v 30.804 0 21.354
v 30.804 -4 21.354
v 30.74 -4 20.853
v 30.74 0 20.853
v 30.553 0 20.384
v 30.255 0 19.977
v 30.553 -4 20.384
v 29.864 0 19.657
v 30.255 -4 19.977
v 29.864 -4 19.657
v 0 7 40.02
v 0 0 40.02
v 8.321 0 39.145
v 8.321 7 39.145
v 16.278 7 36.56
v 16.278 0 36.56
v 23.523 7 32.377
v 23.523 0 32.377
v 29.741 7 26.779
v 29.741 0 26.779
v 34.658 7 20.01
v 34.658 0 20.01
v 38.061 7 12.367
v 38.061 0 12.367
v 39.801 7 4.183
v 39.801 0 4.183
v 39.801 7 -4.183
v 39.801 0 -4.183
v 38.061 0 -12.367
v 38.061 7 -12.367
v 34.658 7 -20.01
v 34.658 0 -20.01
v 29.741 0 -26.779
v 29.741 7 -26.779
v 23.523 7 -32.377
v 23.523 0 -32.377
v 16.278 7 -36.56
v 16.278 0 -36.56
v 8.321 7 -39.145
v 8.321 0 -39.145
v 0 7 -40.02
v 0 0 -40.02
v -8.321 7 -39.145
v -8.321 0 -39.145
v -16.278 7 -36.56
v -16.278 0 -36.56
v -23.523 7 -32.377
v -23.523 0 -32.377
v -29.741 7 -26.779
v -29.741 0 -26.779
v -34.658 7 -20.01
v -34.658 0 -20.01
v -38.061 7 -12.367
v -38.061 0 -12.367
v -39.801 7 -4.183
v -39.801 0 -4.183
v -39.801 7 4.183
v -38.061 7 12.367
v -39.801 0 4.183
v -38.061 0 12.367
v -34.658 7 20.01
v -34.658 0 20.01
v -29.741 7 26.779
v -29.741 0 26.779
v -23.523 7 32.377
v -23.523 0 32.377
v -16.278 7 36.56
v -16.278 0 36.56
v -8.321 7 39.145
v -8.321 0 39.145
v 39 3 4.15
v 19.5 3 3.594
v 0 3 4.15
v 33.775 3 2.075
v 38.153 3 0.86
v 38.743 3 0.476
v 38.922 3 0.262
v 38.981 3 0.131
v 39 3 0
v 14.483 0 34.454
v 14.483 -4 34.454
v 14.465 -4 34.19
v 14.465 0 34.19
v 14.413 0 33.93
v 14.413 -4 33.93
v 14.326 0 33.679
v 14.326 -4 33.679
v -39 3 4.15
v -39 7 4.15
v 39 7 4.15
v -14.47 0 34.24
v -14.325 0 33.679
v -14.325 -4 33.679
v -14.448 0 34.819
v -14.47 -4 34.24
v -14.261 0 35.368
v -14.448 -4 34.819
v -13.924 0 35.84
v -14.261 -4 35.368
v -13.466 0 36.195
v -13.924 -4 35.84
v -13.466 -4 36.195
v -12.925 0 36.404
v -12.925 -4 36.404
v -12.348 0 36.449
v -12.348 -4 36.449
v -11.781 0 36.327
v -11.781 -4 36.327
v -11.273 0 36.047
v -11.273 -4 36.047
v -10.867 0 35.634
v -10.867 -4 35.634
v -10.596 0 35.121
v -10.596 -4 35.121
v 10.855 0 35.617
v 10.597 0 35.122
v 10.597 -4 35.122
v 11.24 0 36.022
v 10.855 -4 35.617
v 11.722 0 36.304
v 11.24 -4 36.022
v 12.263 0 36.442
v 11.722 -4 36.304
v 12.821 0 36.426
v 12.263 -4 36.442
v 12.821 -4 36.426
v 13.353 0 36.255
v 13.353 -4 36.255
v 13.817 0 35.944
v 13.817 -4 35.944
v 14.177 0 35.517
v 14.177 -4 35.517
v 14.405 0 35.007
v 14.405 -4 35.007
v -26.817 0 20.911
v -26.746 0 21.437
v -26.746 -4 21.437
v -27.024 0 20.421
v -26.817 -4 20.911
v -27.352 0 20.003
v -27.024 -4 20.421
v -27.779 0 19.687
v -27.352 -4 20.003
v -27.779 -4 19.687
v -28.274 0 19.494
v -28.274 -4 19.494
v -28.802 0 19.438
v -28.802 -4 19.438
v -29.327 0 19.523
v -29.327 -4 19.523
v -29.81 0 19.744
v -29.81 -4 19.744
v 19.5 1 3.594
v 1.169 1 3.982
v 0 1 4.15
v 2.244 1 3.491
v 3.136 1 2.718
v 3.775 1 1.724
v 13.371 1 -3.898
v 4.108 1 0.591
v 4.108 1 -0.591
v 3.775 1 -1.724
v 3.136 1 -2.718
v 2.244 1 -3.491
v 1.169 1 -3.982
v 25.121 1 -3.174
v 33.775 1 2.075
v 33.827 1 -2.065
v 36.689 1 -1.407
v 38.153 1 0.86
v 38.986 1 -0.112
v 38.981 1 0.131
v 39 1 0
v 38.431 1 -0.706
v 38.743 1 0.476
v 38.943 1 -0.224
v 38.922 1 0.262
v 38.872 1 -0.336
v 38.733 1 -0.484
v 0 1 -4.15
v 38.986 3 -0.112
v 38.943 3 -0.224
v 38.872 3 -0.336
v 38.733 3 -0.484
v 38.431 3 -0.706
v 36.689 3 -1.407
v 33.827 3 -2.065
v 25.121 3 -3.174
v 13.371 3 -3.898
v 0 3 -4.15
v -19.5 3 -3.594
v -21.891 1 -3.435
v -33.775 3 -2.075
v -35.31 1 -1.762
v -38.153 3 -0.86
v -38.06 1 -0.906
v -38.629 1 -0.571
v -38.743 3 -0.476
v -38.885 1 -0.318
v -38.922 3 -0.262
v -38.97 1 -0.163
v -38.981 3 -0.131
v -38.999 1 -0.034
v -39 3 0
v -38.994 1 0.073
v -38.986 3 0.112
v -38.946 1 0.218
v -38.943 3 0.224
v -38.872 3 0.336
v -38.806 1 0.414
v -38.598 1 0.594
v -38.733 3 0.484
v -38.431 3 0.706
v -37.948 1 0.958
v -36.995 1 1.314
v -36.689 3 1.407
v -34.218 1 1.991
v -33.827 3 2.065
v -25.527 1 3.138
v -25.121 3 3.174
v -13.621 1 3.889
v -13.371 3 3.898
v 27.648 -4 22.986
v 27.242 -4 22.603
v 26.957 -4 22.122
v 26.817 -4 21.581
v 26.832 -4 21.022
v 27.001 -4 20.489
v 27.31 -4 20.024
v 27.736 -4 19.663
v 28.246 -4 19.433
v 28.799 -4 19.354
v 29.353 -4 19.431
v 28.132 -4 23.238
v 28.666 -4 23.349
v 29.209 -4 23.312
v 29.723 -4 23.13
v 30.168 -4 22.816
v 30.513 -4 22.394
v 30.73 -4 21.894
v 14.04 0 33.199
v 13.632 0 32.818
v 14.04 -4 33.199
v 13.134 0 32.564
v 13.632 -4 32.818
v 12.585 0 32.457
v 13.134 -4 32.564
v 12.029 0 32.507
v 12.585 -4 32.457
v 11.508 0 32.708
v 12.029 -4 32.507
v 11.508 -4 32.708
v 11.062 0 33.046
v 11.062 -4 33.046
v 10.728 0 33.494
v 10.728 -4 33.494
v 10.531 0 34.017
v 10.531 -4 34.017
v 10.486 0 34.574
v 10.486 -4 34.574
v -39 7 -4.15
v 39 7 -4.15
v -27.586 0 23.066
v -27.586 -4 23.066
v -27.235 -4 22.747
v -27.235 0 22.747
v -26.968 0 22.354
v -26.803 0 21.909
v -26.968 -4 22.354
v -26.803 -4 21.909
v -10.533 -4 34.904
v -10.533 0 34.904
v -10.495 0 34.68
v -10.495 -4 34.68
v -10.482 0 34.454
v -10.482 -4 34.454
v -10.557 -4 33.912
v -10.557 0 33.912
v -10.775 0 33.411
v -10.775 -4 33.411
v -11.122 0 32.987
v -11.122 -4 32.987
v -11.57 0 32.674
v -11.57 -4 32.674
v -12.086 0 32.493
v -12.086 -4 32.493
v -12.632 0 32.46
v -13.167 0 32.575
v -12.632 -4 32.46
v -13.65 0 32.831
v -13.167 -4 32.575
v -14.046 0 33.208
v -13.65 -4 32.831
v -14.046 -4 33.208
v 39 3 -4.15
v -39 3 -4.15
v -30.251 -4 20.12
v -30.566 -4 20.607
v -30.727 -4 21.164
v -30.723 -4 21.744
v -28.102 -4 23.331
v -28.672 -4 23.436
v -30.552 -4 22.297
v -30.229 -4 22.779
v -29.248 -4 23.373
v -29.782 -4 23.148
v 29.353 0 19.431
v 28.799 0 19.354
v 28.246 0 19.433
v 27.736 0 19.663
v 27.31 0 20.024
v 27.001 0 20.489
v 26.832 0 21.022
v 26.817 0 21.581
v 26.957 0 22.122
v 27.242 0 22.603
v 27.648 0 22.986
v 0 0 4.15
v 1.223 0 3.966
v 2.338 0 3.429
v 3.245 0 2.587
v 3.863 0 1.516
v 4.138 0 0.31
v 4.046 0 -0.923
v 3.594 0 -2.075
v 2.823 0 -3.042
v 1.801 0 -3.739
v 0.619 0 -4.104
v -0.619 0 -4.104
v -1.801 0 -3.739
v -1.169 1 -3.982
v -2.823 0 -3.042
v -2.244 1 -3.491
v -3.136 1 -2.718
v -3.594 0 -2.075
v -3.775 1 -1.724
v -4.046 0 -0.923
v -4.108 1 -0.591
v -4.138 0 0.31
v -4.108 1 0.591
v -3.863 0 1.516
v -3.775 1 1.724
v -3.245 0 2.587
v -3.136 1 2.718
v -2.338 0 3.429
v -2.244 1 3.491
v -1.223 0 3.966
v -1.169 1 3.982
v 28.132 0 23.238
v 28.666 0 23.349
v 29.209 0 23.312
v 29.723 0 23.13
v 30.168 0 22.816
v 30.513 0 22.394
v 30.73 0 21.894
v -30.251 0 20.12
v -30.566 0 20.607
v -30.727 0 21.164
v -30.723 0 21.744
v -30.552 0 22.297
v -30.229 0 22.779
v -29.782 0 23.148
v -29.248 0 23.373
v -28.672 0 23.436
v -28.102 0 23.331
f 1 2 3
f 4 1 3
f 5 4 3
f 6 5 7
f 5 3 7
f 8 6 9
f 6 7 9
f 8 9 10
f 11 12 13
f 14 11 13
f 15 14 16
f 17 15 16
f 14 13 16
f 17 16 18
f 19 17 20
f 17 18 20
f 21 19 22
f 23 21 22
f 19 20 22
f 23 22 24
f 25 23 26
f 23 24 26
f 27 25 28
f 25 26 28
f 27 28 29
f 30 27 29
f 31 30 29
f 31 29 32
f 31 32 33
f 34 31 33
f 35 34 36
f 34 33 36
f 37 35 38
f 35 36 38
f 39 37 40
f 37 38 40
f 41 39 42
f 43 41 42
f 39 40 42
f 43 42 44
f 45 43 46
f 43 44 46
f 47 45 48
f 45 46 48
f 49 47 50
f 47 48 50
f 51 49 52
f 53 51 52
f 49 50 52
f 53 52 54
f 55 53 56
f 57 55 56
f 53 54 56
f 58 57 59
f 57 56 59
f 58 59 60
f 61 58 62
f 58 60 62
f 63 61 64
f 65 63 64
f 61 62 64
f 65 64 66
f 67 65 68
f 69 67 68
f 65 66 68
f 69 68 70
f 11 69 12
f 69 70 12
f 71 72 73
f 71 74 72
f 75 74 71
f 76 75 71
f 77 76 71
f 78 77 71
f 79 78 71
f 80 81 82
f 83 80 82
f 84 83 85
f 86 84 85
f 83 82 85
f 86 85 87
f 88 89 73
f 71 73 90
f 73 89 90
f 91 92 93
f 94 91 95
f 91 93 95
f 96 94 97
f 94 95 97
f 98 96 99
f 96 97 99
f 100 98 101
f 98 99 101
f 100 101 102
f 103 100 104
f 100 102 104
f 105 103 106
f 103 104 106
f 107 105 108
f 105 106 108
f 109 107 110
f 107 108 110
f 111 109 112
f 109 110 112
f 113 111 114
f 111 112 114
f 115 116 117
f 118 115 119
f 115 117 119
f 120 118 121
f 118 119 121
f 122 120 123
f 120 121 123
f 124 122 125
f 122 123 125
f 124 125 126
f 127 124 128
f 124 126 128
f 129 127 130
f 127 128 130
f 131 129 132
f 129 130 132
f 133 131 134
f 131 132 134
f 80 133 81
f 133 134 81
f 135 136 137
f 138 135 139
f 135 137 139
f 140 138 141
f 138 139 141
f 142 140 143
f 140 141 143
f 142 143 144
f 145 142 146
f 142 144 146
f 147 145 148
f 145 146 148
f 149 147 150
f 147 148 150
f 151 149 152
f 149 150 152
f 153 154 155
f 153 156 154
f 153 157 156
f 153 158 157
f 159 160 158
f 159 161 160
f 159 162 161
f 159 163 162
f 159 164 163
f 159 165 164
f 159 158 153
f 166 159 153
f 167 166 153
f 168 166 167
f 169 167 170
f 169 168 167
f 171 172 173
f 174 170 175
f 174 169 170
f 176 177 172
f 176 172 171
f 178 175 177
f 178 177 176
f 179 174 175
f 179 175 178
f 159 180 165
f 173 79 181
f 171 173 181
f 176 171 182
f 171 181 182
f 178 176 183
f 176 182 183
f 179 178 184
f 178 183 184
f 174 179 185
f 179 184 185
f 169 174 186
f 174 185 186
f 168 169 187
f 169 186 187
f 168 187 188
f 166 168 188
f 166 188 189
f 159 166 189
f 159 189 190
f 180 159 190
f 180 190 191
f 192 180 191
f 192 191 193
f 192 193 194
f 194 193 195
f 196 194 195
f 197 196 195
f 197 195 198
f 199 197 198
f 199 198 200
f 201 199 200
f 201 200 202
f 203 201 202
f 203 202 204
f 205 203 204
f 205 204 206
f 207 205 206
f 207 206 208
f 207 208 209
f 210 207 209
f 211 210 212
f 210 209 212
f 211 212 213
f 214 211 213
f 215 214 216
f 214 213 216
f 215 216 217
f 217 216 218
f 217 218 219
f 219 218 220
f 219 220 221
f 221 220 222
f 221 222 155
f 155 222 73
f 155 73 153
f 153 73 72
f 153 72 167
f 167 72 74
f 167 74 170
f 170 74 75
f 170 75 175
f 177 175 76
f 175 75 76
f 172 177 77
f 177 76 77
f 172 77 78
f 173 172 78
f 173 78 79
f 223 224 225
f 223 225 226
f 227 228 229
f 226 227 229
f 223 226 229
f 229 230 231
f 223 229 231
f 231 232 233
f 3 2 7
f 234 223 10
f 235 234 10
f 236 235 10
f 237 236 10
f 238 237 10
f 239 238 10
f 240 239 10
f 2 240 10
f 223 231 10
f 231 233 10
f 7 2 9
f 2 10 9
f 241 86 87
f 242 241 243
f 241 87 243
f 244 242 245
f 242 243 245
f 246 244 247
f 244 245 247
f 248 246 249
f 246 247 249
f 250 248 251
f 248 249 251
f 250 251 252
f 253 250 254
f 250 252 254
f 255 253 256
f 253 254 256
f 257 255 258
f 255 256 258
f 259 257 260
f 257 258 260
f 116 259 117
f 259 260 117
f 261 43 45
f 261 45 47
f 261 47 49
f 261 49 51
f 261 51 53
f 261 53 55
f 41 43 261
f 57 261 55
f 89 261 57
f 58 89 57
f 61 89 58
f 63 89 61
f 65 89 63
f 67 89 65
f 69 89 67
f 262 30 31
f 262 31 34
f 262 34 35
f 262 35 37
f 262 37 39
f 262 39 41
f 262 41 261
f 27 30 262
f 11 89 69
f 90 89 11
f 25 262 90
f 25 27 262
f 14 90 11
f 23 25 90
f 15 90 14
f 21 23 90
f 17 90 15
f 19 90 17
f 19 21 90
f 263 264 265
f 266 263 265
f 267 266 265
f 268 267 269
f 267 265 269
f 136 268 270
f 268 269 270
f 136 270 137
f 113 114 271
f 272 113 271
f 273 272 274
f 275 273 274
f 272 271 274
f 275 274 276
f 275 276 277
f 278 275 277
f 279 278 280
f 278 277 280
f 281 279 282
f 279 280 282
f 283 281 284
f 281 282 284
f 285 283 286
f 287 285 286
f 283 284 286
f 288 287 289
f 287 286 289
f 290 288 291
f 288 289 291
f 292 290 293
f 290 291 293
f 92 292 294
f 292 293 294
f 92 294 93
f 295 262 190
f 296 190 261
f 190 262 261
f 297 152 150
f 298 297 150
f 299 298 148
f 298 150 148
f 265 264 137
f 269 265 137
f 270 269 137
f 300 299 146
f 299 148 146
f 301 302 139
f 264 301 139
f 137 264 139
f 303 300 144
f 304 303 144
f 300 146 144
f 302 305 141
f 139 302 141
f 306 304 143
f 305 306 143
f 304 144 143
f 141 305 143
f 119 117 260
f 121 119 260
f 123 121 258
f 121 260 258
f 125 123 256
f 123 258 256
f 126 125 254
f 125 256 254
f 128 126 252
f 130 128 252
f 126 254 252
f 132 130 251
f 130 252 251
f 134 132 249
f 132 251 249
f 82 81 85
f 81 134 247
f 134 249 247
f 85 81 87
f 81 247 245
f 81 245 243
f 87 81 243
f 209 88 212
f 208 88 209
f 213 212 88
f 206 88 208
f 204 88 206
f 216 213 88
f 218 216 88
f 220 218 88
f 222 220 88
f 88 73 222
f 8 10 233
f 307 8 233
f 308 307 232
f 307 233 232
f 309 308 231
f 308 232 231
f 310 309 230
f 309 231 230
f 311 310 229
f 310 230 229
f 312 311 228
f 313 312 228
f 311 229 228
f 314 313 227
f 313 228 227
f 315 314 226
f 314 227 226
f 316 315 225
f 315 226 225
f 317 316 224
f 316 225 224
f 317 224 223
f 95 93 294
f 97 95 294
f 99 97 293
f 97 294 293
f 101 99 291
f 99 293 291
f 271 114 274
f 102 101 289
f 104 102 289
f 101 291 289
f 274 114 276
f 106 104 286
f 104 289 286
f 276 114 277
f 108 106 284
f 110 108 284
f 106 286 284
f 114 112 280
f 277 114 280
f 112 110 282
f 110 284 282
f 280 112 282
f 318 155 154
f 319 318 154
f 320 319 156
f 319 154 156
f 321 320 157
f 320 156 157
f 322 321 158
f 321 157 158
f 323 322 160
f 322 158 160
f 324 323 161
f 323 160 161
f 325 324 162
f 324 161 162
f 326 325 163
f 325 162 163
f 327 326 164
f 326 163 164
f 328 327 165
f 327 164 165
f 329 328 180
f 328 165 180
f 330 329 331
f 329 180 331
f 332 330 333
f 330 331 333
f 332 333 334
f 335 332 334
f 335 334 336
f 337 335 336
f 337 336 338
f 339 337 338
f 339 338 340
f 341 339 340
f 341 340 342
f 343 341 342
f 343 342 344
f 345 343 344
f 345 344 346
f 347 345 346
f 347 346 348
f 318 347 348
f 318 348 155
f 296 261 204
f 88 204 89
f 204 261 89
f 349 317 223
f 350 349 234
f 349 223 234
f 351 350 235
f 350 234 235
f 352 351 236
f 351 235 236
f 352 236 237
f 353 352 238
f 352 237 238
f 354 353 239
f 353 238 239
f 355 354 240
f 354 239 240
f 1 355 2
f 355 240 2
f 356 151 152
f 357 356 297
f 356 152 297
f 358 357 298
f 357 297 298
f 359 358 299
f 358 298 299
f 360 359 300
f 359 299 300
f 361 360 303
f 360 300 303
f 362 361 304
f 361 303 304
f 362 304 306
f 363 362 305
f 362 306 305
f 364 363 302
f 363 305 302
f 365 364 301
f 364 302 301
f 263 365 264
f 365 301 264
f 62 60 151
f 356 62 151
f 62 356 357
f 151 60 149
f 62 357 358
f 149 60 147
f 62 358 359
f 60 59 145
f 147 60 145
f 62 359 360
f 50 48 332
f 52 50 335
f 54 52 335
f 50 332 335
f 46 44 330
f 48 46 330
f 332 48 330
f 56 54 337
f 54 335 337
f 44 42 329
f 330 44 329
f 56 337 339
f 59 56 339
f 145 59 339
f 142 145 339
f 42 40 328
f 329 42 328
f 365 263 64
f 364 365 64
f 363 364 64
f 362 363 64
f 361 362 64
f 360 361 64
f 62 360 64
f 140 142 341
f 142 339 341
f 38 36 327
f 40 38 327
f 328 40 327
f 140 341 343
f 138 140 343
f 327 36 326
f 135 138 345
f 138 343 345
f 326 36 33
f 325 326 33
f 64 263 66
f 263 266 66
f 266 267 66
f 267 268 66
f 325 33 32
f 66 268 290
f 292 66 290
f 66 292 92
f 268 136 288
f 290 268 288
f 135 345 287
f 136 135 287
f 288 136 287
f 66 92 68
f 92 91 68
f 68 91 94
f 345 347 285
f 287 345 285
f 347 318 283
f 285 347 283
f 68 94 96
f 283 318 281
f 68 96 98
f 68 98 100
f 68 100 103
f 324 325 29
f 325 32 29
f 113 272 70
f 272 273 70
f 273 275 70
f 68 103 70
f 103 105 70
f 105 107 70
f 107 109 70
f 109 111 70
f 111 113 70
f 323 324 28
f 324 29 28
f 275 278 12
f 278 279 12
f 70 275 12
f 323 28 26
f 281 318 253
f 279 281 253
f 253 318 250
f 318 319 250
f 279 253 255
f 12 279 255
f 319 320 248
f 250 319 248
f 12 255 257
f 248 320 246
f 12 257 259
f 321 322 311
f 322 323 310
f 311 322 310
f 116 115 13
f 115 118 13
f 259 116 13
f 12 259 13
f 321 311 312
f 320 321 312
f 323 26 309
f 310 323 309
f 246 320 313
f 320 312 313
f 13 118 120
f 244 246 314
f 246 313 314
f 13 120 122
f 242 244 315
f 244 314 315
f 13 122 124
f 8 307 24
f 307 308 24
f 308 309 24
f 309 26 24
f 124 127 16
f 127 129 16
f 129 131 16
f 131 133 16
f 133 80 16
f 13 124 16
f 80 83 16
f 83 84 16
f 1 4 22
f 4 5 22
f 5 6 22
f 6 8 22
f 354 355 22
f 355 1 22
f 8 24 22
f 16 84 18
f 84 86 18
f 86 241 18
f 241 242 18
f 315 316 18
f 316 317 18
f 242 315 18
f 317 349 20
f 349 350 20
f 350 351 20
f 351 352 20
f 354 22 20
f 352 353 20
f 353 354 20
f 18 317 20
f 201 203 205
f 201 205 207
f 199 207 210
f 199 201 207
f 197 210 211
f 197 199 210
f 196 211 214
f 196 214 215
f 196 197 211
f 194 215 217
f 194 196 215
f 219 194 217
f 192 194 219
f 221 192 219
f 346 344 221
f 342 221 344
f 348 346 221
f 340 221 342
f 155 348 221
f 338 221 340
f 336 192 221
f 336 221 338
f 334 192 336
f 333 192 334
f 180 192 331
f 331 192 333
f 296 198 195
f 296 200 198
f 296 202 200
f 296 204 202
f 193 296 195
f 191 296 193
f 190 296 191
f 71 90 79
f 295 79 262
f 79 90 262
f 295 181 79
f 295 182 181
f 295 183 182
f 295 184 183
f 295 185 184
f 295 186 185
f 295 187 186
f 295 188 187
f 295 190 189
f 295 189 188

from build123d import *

# Parameters (mm, degrees)
SKETCH_9_R           = 40.020028018
EXTRUDE_3_DEPTH      = 7
EXTRUDE_4_DEPTH      = 7
EXTRUDE_4_DEPTH_BACK = 4
SKETCH_9_3_R         = 2
SKETCH_10_W          = 78
SKETCH_10_H          = 8.3
CUT_EXTRUDE_4_DEPTH  = 4
SKETCH_12_RX         = 39
SKETCH_12_RY         = 4.15
CUT_EXTRUDE_6_DEPTH  = 2
SKETCH_13_R          = 4.15
CUT_EXTRUDE_7_DEPTH  = 57.914016597


with BuildPart() as part:
    # 草图9 → 凸台-拉伸3 (new body)
    with BuildSketch(Plane(origin=(0, 0, 0), x_dir=(1, 0, 0), z_dir=(0, 1, 0))):
        Circle(SKETCH_9_R)
        with BuildLine():
            ThreePointArc((-27.585789036, -23.066203122), (-30.407992627, -22.550065759), (-29.810498329, -19.743959658))
            ThreePointArc((-29.810498329, -19.743959658), (-27.778871949, -19.686725751), (-26.746176582, -21.437246172))
            ThreePointArc((-26.746176582, -21.437246172), (-26.968428696, -22.353549864), (-27.585789036, -23.066203122))
        make_face(mode=Mode.SUBTRACT)
        with BuildLine():
            ThreePointArc((-10.596443163, -35.12129407), (-13.203413531, -36.31918237), (-14.325449842, -33.678677608))
            ThreePointArc((-14.325449842, -33.678677608), (-12.086387614, -32.493377831), (-10.481803809, -34.453899709))
            ThreePointArc((-10.481803809, -34.453899709), (-10.51067199, -34.792484046), (-10.596443163, -35.12129407))
        make_face(mode=Mode.SUBTRACT)
        with BuildLine():
            ThreePointArc((14.482594231, -34.454465093), (12.821133927, -36.425604579), (10.597203357, -35.121774056))
            ThreePointArc((10.597203357, -35.121774056), (11.761068998, -32.589149748), (14.326275376, -33.679326501))
            ThreePointArc((14.326275376, -33.679326501), (14.443125064, -34.059093299), (14.482594231, -34.454465093))
        make_face(mode=Mode.SUBTRACT)
        with BuildLine():
            ThreePointArc((30.804113616, -21.353828271), (29.722993149, -23.130246128), (27.648453212, -22.986142282))
            ThreePointArc((27.648453212, -22.986142282), (27.139078544, -20.245830883), (29.863522136, -19.657463456))
            ThreePointArc((29.863522136, -19.657463456), (30.553230113, -20.383987315), (30.804113616, -21.353828271))
        make_face(mode=Mode.SUBTRACT)
    extrude(amount=EXTRUDE_3_DEPTH)

    # 草图9<3> → 凸台-拉伸4 (add, two sides: drawn at the far end of the back side and taken through both)
    with BuildSketch(Plane(origin=(0, 0, 0), x_dir=(1, 0, 0), z_dir=(0, 1, 0)).offset(-EXTRUDE_4_DEPTH_BACK)):
        with Locations((-28.746176582, -21.437246172)):
            Circle(SKETCH_9_3_R)
        with Locations((28.804113616, -21.353828271)):
            Circle(SKETCH_9_3_R)
        with Locations((12.482594231, -34.454465093)):
            Circle(SKETCH_9_3_R)
        with Locations((-12.481803809, -34.453899709)):
            Circle(SKETCH_9_3_R)
    extrude(amount=EXTRUDE_4_DEPTH + EXTRUDE_4_DEPTH_BACK)

    # 草图10 → 切除-拉伸4 (cut)
    with BuildSketch(Plane(origin=(0, 7, 0), x_dir=(1, 0, 0), z_dir=(0, 1, 0))):
        Rectangle(SKETCH_10_W, SKETCH_10_H)
    extrude(amount=-CUT_EXTRUDE_4_DEPTH, mode=Mode.SUBTRACT)

    # 草图12 → 切除-拉伸6 (cut)
    with BuildSketch(Plane(origin=(0, 3, 0), x_dir=(1, 0, 0), z_dir=(0, 1, 0))):
        with Locations(Location((0, 0), (0, 0, 0))):
            Ellipse(SKETCH_12_RX, SKETCH_12_RY)
    extrude(amount=-CUT_EXTRUDE_6_DEPTH, mode=Mode.SUBTRACT)

    # 草图13 → 切除-拉伸7 (cut, through all)
    with BuildSketch(Plane(origin=(0, 1, 0), x_dir=(1, 0, 0), z_dir=(0, 1, 0))):
        Circle(SKETCH_13_R)
    extrude(amount=-CUT_EXTRUDE_7_DEPTH, mode=Mode.SUBTRACT)


solid = part.part
